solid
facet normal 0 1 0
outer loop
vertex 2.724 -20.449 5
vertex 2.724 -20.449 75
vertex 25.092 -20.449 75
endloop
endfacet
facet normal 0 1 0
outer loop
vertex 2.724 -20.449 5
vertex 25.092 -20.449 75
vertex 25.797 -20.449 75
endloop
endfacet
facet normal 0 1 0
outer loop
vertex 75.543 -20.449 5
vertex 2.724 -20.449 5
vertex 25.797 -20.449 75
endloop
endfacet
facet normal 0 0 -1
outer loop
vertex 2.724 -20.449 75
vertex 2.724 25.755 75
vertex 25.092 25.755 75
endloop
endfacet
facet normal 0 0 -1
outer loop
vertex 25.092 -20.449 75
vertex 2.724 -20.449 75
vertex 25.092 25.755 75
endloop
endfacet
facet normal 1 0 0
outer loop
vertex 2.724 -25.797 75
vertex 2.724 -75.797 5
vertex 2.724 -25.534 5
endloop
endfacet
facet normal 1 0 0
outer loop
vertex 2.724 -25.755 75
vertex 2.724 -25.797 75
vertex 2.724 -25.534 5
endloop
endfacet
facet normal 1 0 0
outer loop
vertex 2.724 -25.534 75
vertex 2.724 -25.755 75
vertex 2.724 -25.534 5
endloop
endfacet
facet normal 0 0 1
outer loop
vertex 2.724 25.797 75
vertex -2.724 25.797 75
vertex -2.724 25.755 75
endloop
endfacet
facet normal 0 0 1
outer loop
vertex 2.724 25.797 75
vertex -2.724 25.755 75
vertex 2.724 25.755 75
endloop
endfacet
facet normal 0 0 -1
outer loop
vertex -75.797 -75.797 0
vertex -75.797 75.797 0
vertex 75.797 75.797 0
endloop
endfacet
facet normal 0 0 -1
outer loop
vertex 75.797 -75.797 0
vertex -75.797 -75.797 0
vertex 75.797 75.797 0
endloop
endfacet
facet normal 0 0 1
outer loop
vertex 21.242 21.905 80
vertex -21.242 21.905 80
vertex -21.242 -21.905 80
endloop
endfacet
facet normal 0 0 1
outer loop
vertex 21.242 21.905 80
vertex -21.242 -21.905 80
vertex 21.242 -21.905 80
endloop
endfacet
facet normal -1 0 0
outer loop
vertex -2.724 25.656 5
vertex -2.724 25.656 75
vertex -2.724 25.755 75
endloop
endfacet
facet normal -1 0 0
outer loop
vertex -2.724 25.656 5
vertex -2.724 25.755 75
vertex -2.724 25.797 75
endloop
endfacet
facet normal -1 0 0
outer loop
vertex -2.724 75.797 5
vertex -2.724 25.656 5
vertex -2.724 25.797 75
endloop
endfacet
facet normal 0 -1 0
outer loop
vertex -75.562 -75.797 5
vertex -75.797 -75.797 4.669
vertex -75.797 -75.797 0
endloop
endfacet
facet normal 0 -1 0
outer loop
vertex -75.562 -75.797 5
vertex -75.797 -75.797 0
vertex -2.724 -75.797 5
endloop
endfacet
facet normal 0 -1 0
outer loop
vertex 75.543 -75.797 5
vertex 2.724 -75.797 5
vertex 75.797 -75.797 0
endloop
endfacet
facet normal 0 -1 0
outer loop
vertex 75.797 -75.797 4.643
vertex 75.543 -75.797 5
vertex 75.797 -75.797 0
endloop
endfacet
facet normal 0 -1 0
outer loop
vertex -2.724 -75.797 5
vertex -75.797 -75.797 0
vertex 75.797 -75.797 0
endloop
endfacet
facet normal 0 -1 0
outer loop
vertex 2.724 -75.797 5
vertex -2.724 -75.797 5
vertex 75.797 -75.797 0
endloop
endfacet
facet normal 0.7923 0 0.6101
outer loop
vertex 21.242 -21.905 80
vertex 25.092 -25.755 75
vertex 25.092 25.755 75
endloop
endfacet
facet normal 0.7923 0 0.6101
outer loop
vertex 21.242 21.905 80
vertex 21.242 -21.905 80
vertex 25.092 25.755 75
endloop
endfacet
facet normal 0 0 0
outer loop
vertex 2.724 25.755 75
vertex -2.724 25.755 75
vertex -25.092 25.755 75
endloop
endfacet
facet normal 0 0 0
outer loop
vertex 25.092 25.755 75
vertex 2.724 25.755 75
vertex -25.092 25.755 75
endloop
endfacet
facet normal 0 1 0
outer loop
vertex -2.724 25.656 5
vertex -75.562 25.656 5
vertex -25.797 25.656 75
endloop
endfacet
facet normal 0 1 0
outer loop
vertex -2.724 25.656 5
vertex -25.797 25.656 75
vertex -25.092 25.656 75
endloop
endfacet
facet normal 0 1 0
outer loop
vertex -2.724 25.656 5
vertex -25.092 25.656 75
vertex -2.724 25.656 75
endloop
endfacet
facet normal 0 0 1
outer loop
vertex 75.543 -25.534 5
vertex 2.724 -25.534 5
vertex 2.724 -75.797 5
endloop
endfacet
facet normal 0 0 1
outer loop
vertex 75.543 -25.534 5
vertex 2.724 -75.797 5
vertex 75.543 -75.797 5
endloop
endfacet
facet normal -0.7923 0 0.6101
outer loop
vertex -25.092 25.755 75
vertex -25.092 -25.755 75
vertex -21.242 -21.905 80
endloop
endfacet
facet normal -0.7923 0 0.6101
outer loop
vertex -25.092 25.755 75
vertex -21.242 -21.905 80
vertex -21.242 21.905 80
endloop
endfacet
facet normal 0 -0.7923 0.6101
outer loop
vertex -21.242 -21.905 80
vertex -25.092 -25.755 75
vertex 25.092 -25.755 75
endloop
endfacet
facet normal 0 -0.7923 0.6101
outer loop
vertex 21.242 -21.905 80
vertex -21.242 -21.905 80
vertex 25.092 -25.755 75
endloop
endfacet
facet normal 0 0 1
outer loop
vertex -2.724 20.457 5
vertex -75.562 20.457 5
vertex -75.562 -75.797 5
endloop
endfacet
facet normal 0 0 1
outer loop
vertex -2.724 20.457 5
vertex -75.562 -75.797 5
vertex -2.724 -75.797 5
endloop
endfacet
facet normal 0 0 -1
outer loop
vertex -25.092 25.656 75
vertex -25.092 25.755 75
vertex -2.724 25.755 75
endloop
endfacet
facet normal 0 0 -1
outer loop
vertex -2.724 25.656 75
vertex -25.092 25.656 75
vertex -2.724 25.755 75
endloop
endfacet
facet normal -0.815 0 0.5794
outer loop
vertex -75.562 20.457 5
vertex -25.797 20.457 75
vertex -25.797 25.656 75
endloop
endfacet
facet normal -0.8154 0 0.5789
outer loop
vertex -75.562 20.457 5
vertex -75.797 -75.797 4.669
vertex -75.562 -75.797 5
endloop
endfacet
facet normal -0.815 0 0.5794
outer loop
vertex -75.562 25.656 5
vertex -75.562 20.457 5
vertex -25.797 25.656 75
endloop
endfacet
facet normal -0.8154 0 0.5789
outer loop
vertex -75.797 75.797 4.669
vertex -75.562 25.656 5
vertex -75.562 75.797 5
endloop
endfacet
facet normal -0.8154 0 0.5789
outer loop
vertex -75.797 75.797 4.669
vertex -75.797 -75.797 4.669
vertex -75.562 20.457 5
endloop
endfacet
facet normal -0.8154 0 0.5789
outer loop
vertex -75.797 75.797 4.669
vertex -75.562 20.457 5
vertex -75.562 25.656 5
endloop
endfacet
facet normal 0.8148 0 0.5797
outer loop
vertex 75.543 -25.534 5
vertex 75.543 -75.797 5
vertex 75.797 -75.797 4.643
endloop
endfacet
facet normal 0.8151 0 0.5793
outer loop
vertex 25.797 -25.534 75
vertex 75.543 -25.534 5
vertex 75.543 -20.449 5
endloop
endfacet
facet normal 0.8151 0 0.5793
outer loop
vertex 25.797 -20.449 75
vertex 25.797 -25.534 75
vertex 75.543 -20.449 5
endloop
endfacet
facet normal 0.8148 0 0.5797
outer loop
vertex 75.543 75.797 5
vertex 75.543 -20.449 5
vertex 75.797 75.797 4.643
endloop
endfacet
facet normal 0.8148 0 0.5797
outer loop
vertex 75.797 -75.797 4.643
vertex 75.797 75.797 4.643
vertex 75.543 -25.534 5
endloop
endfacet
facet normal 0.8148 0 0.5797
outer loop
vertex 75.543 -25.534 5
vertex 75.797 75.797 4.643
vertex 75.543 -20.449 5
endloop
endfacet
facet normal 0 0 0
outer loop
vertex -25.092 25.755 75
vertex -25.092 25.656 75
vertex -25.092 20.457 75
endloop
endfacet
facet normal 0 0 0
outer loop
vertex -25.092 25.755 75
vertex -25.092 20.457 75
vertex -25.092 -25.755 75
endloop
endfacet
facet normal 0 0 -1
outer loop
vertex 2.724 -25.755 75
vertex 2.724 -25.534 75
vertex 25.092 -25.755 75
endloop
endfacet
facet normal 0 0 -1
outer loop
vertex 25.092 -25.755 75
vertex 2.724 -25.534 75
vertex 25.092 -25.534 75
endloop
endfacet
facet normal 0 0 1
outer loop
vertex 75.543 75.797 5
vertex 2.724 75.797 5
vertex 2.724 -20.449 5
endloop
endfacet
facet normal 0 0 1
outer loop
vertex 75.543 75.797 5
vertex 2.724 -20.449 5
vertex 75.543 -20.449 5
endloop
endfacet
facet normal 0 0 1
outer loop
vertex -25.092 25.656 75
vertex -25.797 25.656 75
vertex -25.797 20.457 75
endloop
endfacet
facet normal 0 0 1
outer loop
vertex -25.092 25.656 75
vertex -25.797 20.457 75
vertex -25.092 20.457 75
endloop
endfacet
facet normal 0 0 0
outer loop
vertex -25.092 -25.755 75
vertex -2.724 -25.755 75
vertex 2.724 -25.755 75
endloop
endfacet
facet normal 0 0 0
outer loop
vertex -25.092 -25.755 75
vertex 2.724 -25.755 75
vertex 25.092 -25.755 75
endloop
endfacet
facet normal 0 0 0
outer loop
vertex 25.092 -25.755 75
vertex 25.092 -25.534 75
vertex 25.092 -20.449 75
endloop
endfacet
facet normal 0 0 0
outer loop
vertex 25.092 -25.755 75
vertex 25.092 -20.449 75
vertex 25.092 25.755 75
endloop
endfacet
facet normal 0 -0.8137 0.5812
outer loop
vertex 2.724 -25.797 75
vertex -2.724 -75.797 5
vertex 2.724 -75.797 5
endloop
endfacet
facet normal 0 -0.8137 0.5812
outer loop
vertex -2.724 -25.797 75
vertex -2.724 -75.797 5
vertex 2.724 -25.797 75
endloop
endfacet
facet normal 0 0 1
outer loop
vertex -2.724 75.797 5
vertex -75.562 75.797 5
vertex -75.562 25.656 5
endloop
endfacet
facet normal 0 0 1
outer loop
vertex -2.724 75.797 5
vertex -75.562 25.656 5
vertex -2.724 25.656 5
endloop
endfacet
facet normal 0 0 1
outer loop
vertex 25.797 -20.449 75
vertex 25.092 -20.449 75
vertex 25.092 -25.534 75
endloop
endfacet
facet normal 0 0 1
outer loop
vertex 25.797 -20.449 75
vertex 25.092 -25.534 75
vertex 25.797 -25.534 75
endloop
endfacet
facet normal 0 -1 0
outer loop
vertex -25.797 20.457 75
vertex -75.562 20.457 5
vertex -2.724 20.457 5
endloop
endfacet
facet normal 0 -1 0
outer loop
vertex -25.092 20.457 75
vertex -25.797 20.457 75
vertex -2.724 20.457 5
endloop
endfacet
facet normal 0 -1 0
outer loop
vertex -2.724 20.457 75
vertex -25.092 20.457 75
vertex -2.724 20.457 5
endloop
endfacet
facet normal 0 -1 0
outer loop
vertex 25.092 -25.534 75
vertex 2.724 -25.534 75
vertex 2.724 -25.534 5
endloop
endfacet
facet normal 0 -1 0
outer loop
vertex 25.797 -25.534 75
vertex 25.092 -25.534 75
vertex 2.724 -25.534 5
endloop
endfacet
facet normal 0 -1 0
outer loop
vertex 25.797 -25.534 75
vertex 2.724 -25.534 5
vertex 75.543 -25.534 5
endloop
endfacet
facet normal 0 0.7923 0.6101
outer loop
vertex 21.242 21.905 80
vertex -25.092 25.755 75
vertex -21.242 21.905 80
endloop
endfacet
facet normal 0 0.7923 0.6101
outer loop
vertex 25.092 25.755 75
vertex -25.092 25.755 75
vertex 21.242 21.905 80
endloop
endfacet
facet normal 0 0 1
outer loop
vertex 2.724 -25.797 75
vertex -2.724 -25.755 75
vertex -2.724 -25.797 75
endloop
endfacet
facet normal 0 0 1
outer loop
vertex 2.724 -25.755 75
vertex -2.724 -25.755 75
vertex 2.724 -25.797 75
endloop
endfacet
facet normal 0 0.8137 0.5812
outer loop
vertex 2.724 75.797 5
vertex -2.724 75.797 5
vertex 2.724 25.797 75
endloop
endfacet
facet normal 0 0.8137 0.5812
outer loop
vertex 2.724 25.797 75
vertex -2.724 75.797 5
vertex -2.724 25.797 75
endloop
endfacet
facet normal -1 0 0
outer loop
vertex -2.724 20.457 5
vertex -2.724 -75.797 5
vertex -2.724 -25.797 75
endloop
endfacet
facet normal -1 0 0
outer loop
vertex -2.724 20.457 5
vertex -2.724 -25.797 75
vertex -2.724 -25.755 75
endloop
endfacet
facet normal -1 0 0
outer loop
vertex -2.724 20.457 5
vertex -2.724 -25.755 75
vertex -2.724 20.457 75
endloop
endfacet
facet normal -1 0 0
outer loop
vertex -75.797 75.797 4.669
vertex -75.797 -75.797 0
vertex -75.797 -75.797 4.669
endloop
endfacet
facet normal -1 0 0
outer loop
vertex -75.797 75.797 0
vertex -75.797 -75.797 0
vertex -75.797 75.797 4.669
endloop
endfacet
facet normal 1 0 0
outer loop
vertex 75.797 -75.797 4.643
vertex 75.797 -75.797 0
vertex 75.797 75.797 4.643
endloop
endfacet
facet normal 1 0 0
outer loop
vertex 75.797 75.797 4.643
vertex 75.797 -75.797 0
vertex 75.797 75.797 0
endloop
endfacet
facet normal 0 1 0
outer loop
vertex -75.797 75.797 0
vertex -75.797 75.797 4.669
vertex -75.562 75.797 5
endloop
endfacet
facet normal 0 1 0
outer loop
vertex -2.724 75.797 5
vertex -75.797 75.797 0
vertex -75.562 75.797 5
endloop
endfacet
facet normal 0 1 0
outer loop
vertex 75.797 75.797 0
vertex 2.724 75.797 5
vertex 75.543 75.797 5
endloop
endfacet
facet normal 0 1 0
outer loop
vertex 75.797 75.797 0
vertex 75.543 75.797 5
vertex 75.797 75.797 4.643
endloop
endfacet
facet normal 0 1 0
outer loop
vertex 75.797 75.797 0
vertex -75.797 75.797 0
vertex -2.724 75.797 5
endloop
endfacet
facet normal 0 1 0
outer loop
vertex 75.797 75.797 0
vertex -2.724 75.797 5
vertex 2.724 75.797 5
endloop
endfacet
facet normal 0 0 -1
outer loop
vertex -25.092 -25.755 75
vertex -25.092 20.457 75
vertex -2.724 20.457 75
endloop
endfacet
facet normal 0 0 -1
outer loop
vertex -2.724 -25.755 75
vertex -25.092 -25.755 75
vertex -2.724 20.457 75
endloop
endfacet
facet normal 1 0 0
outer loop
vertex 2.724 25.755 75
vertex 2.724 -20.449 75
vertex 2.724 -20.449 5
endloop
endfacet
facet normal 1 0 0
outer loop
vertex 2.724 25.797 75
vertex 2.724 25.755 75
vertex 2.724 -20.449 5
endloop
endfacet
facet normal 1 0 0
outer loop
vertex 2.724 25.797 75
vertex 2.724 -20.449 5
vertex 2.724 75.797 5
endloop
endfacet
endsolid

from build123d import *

# Parameters (mm, degrees)
F0_W        = 151.593759656
F0_H        = 151.593759656
F1_DEPTH    = 5
F2_W        = 5.4470277391
F2_H        = 151.593759656
F3_DEPTH    = 70
F4_T1_DEPTH = 366.9308973901
F5_T1_DEPTH = 366.9308973901
F6_W        = 50.1838475466
F6_H        = 51.510296762
F7_DEPTH    = 5
F8_SIZE2    = 4.99999
F8_SIZE     = 3.84999
F9_W        = 73.0733659584
F9_H        = 5.1989573985
F10_DEPTH   = 70
F11_SIZE2   = 70.3308355562
F11_SIZE    = 50
F12_W       = 73.0733659584
F12_H       = 5.0847064704
F13_DEPTH   = 70
F14_SIZE2   = 50
F14_SIZE    = 70.3568348711


# Not quite as in the source:
# - a fillet or chamfer that OpenCascade refuses, or shapes differently, is made with other operations: its cross-section is extruded or revolved along the edge and cut away or added
# - a fillet or chamfer is up to 0.001 mm smaller than in the source, because OpenCascade refuses the exact size


with BuildPart() as f1:
    # F0 (on Top) → F1 (new body)
    with BuildSketch(Plane.XY):
        Rectangle(F0_W, F0_H)
    extrude(amount=F1_DEPTH)

    # F2 (on face) → F3 (join)
    with BuildSketch(Plane.XY.offset(5)):
        Rectangle(F2_W, F2_H)
    extrude(amount=F3_DEPTH)

    # F4: chamfer of 50 x 70 on 1 edges, made by hand

    # F4_s2 → F4_t1 (cut)
    with BuildSketch(Plane.YZ.offset(-183.465448695)):
        Polygon((-75.796879828, 5), (-25.796879828, 75), (-75.796879828, 75), align=None)
    extrude(amount=F4_T1_DEPTH, mode=Mode.SUBTRACT)

    # F5: chamfer of 70 x 50 on 1 edges, made by hand

    # F5_s2 → F5_t1 (cut)
    with BuildSketch(Plane.YZ.offset(-183.465448695)):
        Polygon((75.796879828, 5), (25.796879828, 75), (75.796879828, 75), align=None)
    extrude(amount=F5_T1_DEPTH, mode=Mode.SUBTRACT)

    # F6 (on face) → F7 (join)
    with BuildSketch(Plane.XY.offset(75)):
        Rectangle(F6_W, F6_H)
    extrude(amount=F7_DEPTH)

    # F8 (size 3.85 and 5 in the source; OpenCascade refuses exactly that, so slightly less here)
    f8_edges = [f1.edges().sort_by_distance(p)[0] for p in [
        (25.091924, 0, 80),
        (0, -25.755148, 80),
        (0, 25.755148, 80),
        (-25.091924, 0, 80),
    ]]
    f8_side = f1.faces().sort_by_distance((0, 0, 80))[0]
    chamfer(f8_edges, length=F8_SIZE, length2=F8_SIZE2, reference=f8_side)

    # F9 (on face) → F10 (join)
    with BuildSketch(Plane.XY.offset(5)):
        with Locations((-39.2601968488, 23.0562509969)):
            Rectangle(F9_W, F9_H)
    extrude(amount=F10_DEPTH)

    # F11
    f11_edges = [f1.edges().sort_by_distance(p)[0] for p in [
        (-75.79688, 23.056251, 75),
    ]]
    f11_side = f1.faces().sort_by_distance((-50.444402, 23.056251, 75))[0]
    chamfer(f11_edges, length=F11_SIZE, length2=F11_SIZE2, reference=f11_side)

    # F12 (on face) → F13 (join)
    with BuildSketch(Plane.XY.offset(5)):
        with Locations((39.2601968488, -22.9917196557)):
            Rectangle(F12_W, F12_H)
    extrude(amount=F13_DEPTH)

    # F14
    f14_edges = [f1.edges().sort_by_distance(p)[0] for p in [
        (75.79688, -22.99172, 75),
    ]]
    f14_side = f1.faces().sort_by_distance((75.79688, -74.105559, 2.5))[0]
    chamfer(f14_edges, length=F14_SIZE, length2=F14_SIZE2, reference=f14_side)


solid = f1.part
